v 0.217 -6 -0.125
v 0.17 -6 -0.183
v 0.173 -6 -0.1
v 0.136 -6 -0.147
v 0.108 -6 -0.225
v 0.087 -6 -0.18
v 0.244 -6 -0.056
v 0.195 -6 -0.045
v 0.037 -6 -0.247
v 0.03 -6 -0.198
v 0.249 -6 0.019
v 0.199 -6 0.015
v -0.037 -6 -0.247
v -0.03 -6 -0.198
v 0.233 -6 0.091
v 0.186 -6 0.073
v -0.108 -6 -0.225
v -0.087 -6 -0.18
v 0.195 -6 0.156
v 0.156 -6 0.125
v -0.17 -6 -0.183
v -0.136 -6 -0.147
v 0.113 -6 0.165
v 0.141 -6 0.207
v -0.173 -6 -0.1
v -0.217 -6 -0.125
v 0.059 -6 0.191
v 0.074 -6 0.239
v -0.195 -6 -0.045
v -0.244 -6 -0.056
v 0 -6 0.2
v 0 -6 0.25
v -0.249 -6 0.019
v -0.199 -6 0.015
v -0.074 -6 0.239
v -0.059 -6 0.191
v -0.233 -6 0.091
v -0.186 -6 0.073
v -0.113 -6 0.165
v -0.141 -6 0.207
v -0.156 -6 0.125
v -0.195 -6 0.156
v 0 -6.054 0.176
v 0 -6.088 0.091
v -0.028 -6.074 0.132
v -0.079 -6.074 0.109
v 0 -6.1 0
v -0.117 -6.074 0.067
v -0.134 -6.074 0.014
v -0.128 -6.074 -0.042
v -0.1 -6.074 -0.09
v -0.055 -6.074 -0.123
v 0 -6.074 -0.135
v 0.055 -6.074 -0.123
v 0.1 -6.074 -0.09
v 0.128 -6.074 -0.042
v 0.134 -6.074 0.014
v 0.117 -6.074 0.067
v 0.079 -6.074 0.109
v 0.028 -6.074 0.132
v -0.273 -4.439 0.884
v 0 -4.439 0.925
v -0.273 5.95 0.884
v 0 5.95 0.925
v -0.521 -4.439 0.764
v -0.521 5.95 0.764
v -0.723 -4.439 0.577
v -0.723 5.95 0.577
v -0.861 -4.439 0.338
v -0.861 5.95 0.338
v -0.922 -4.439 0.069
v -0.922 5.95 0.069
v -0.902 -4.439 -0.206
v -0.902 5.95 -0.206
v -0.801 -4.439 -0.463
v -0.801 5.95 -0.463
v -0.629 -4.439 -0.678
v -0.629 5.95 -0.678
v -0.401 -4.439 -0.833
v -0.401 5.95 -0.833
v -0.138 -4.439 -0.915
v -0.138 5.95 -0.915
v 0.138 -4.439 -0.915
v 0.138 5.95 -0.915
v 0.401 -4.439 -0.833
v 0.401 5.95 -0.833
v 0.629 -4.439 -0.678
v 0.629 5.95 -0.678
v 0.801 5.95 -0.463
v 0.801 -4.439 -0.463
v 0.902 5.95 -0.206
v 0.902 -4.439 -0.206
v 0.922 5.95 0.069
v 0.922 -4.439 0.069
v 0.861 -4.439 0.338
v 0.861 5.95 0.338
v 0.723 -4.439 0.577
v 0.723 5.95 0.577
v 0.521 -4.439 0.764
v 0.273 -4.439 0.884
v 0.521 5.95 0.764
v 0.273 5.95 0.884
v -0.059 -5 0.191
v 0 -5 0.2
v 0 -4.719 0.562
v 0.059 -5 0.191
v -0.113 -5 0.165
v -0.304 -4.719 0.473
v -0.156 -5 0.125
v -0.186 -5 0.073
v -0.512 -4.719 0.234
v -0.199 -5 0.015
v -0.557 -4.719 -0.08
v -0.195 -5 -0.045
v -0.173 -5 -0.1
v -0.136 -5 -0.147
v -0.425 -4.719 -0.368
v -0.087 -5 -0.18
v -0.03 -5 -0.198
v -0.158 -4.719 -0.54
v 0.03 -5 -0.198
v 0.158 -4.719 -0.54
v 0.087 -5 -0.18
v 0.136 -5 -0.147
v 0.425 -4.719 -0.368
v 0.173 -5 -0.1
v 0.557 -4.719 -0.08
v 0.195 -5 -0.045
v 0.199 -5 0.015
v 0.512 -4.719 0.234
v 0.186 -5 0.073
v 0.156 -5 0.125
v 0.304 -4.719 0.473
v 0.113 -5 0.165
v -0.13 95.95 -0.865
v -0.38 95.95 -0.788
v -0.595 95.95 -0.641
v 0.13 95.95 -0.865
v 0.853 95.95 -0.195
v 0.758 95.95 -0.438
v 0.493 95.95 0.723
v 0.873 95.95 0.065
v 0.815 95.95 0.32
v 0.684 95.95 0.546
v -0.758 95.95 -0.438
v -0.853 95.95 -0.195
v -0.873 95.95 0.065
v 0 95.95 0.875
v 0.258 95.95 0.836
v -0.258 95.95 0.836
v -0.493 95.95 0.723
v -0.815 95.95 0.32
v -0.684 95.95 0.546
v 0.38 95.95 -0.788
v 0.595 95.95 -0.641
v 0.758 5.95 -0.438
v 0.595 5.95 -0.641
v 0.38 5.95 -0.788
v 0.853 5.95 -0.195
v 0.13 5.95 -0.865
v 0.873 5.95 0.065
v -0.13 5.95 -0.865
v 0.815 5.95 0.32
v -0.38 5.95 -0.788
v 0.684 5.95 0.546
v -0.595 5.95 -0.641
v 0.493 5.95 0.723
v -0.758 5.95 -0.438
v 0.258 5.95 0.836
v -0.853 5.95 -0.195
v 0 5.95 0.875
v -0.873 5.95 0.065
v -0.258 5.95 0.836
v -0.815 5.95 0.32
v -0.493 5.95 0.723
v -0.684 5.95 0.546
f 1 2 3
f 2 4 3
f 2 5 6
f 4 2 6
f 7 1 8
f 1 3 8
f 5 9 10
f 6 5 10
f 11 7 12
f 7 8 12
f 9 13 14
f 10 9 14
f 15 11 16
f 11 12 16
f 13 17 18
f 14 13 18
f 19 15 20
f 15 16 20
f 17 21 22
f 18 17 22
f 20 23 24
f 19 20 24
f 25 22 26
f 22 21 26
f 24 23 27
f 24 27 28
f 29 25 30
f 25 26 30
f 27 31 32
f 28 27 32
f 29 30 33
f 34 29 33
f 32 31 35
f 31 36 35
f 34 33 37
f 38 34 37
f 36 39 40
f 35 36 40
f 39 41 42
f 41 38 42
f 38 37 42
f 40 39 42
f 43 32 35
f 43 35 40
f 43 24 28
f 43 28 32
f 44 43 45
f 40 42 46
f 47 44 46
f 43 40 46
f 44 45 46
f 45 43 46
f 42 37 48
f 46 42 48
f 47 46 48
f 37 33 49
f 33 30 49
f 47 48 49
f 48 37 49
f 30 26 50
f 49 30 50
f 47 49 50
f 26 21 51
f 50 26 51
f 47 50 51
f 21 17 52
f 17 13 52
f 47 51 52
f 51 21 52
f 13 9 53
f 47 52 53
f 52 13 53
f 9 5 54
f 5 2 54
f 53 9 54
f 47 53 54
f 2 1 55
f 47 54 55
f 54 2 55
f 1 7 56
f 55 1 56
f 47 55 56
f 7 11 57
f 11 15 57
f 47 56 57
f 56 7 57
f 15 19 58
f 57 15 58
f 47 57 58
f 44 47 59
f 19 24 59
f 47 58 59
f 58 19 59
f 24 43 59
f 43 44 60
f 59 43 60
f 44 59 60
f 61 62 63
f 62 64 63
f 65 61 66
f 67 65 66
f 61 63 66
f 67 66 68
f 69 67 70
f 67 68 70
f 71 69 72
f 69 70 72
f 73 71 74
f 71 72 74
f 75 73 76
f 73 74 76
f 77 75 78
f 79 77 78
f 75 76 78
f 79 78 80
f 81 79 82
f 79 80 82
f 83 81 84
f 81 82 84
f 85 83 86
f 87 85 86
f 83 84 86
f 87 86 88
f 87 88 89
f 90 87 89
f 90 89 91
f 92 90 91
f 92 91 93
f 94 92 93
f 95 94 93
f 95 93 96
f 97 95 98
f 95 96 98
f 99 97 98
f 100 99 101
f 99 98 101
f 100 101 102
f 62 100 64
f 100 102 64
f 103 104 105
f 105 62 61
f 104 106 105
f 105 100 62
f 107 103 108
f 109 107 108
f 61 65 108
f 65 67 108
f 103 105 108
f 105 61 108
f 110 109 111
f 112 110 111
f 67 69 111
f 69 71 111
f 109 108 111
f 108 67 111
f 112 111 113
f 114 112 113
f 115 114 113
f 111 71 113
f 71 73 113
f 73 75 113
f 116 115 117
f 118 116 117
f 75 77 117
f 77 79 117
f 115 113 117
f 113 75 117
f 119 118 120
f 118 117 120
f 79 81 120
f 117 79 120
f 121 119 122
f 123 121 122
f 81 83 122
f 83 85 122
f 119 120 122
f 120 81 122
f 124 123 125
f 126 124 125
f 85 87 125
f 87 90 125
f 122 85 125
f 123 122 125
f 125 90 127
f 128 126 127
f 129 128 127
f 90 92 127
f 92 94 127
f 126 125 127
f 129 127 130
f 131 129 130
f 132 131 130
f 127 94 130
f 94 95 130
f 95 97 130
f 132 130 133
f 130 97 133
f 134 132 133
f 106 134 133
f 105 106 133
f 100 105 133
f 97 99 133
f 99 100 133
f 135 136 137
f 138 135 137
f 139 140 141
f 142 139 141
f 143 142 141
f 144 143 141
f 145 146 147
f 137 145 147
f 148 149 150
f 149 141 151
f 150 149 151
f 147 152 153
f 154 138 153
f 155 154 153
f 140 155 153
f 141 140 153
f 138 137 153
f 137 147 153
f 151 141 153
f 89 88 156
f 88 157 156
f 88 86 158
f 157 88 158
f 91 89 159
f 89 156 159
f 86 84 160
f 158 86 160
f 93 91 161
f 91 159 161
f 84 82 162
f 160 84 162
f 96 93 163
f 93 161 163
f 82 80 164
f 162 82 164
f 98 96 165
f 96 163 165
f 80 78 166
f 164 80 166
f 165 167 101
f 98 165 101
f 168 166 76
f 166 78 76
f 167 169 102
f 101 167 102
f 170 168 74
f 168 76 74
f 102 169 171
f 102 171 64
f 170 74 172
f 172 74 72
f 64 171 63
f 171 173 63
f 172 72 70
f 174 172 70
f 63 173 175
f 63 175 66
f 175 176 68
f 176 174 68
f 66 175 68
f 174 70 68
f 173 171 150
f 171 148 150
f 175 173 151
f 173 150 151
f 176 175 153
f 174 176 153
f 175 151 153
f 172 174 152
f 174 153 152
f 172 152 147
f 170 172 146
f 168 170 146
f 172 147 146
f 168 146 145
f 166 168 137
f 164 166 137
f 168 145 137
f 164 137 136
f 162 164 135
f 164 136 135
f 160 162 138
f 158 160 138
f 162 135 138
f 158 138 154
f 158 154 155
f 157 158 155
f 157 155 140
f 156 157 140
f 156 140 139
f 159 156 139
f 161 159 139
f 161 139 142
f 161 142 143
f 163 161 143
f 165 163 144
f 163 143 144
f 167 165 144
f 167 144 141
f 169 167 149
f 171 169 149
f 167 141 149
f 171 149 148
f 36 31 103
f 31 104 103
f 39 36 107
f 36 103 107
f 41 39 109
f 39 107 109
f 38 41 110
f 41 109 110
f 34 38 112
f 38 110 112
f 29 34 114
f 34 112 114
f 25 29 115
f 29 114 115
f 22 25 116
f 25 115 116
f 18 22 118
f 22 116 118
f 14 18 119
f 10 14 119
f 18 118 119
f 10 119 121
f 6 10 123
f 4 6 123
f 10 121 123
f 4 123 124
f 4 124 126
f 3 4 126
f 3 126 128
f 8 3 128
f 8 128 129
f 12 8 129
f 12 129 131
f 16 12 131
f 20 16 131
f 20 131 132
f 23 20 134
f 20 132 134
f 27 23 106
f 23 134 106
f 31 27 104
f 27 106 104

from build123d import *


with BuildPart() as part:
    # Sketch2 → Revolve1 (revolve)
    with BuildSketch(Plane(origin=(0, 0, 0), x_dir=(0, 0, -1), z_dir=(1, 0, 0)), mode=Mode.PRIVATE) as revolve1_sk:
        with BuildLine():
            Line((0.925, -4.438709677), (0.925, 5.95))
            Line((0.925, 5.95), (0.875, 5.95))
            Line((0.875, 5.95), (0.875, 95.95))
            Line((0.875, 95.95), (0, 95.95))
            Line((0, 95.95), (0, -6.1))
            ThreePointArc((0, -6.1), (0.13462912, -6.0740728), (0.25, -6))
            Line((0.25, -6), (0.2, -6))
            Line((0.2, -6), (0.2, -5))
            Line((0.2, -5), (0.925, -4.438709677))
        make_face()
    revolve(revolve1_sk.sketch.rotate(Axis((0, 105.424070968, 0), (0, -1, 0)), 180), axis=Axis((0, 105.424070968, 0), (0, -1, 0)))


solid = part.part
